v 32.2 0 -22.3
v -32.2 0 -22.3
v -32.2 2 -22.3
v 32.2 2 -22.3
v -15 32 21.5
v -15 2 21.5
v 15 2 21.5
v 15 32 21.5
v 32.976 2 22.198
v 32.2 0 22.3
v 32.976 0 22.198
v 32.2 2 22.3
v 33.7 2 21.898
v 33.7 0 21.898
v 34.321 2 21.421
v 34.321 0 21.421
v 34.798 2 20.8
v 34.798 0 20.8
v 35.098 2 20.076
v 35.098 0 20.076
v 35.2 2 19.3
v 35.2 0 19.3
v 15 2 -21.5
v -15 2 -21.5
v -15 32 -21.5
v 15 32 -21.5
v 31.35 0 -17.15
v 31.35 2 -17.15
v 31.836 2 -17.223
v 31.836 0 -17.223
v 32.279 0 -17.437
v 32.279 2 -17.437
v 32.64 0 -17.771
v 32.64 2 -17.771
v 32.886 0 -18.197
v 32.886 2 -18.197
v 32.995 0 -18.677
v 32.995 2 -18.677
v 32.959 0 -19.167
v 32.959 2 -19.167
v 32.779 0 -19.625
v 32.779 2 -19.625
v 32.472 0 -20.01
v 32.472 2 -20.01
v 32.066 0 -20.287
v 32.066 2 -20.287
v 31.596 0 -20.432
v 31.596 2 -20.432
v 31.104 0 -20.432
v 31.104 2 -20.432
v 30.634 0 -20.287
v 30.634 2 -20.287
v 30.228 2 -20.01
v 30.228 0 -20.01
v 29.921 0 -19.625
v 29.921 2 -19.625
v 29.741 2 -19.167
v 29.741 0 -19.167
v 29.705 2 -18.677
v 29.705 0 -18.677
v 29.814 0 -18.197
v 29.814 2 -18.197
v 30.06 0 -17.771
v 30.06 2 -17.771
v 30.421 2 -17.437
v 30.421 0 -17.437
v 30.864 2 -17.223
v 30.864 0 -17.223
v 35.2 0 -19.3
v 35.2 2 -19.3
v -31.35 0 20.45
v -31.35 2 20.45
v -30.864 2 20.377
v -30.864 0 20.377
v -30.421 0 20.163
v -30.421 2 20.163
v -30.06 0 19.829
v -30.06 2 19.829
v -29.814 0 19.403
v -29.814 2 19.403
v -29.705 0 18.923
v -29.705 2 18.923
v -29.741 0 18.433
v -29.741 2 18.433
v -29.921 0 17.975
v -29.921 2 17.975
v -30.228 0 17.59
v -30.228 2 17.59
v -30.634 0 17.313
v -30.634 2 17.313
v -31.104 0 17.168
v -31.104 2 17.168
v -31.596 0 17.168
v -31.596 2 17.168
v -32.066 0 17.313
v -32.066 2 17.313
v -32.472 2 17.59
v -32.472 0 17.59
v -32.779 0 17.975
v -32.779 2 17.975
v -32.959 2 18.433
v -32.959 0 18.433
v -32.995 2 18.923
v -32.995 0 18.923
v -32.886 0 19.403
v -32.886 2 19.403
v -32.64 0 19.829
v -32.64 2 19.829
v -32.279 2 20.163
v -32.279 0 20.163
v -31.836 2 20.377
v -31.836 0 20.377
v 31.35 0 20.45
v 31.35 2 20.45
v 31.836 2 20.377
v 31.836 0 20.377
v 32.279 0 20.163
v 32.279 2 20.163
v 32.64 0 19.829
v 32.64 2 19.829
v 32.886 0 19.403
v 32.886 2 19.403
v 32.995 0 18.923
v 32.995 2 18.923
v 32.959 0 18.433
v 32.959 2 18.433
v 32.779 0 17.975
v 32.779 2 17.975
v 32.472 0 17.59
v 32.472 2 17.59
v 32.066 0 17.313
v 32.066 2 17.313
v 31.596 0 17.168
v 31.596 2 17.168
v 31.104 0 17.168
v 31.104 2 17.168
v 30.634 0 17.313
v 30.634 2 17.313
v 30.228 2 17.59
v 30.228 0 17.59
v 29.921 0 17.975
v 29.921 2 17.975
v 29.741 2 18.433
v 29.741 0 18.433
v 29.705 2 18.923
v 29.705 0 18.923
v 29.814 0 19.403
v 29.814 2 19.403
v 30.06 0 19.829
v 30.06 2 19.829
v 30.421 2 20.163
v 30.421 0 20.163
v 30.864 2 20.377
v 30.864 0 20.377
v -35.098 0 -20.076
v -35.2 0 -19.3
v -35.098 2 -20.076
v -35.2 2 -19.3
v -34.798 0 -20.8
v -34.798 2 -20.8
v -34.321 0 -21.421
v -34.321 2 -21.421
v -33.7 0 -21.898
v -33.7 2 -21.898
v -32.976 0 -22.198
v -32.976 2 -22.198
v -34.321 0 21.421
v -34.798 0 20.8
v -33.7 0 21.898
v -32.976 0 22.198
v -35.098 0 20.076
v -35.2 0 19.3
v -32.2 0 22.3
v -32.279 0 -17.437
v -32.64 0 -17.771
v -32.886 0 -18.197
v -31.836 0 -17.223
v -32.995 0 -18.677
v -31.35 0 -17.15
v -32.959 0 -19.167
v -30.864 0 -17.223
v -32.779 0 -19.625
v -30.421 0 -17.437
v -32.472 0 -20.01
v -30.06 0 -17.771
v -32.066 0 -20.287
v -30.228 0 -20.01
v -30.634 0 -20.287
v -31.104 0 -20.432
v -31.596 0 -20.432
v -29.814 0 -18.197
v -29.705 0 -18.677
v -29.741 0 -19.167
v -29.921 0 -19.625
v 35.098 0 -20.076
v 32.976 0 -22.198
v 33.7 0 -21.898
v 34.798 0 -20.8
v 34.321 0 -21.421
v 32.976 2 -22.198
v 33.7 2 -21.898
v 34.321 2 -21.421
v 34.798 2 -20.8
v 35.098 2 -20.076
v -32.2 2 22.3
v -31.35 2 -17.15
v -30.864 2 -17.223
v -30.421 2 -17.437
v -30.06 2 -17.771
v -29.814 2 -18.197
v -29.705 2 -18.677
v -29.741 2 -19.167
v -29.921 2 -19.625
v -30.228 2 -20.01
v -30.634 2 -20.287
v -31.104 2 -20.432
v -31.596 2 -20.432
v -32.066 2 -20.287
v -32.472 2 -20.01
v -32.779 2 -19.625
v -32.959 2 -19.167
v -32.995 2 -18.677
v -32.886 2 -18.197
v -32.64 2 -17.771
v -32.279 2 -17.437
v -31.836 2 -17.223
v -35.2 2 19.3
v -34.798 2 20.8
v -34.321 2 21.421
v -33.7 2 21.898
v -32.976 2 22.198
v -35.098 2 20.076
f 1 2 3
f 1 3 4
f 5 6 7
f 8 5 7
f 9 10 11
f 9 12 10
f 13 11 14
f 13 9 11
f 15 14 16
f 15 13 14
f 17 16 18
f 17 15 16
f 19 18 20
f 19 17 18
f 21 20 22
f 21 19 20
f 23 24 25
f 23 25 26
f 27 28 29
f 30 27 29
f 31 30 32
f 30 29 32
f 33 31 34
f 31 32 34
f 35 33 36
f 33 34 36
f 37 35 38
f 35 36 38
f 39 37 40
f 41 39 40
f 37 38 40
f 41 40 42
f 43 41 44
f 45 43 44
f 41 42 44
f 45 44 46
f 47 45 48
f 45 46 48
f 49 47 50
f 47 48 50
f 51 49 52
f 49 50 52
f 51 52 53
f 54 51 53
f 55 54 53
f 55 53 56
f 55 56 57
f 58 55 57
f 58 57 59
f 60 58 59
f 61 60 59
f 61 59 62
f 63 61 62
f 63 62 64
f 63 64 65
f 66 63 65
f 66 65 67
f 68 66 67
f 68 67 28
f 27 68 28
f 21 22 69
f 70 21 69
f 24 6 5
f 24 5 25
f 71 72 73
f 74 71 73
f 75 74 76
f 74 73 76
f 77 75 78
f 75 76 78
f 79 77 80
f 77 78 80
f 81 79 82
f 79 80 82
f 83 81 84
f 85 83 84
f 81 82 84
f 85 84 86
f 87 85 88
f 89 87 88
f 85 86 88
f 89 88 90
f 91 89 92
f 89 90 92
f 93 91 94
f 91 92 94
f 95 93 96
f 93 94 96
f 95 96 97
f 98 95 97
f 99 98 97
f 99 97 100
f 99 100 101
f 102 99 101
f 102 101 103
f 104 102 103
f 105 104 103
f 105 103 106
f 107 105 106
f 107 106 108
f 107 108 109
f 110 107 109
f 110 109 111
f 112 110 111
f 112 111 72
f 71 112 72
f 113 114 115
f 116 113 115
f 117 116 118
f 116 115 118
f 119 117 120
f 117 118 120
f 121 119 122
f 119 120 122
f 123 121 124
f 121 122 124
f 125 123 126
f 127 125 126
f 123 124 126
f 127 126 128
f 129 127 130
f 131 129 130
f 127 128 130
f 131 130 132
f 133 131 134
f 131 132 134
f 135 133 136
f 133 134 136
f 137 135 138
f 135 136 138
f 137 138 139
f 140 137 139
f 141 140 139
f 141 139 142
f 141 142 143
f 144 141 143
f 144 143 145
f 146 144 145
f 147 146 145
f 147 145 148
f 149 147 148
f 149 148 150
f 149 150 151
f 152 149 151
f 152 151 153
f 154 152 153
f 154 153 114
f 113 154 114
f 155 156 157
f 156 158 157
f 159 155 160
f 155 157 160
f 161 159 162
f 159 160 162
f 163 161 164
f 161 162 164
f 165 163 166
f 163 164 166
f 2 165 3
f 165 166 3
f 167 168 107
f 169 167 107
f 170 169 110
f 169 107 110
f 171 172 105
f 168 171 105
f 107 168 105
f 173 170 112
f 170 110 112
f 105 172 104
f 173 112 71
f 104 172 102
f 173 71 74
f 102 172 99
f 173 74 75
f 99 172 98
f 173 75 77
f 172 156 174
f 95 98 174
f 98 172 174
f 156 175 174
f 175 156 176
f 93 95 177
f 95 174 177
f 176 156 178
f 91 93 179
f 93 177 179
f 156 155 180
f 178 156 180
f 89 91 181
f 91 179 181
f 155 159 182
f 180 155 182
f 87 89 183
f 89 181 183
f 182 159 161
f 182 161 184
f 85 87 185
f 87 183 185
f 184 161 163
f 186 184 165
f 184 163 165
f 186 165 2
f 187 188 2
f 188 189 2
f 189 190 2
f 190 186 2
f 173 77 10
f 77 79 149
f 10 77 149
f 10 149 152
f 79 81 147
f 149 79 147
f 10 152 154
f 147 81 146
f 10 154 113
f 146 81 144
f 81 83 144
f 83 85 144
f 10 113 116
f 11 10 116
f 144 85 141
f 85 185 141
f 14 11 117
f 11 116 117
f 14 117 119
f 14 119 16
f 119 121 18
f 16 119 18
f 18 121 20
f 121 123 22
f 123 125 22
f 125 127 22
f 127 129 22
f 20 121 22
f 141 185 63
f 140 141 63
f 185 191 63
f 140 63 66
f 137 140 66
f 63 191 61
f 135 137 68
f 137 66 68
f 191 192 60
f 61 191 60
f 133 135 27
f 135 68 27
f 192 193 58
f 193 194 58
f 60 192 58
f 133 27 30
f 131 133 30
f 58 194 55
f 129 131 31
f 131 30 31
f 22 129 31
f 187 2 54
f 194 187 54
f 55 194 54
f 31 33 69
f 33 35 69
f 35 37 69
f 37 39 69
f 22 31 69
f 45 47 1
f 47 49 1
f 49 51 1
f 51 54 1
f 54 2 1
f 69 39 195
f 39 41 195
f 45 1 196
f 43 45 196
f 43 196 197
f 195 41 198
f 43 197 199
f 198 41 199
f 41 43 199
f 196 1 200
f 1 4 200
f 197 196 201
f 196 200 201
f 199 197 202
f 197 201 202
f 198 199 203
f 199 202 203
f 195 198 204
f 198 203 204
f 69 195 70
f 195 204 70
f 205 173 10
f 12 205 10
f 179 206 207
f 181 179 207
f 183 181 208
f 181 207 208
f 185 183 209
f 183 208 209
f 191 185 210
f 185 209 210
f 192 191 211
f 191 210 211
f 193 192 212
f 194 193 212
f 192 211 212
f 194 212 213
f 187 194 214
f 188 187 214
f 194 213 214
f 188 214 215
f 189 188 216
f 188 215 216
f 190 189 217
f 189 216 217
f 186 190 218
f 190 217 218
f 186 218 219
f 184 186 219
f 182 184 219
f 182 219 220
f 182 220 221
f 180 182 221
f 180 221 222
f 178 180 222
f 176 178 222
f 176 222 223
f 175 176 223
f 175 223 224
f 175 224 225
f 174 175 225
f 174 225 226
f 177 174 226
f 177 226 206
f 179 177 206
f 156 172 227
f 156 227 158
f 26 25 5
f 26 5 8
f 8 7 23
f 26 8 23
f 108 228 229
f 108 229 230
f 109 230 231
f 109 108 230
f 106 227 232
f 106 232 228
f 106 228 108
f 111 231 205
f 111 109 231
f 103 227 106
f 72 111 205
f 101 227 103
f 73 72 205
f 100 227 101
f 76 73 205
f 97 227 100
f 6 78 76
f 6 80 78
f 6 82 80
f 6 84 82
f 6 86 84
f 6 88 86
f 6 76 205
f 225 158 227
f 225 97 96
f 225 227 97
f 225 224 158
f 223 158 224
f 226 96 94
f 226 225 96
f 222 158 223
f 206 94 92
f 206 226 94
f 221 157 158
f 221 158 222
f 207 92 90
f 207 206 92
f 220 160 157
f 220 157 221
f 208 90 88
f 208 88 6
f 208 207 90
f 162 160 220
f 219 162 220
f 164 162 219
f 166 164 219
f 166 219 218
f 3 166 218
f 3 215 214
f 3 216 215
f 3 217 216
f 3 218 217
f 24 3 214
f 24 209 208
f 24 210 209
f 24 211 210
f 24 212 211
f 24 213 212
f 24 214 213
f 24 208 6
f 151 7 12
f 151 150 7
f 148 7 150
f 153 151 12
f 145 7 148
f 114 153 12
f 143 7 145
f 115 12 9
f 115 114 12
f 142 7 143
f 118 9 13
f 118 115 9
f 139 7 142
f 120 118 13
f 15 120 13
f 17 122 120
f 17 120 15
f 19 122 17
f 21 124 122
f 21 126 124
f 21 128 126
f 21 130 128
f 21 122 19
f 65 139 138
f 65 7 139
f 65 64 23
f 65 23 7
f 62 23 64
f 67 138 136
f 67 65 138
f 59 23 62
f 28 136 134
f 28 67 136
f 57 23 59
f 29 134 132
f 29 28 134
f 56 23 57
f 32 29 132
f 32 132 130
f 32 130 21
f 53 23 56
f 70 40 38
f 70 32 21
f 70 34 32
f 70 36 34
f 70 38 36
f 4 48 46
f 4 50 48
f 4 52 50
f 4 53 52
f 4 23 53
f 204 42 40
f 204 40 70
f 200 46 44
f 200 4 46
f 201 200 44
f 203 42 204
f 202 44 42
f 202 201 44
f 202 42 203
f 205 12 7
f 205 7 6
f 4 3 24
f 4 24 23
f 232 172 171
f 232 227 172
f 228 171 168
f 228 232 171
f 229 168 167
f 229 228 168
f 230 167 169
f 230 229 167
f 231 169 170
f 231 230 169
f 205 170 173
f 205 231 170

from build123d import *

# Parameters (mm, degrees)
SKETCH1_W           = 70.4
SKETCH1_H           = 44.6
BOSS_EXTRUDE1_DEPTH = 2
SKETCH3_R           = 1.65
CUT_EXTRUDE1_DEPTH  = 42.717262614
FILLET1_R           = 3
SKETCH4_W           = 30
SKETCH4_H           = 43
BOSS_EXTRUDE2_DEPTH = 30


with BuildPart() as part:
    # Sketch1 → Boss-Extrude1 (new body)
    with BuildSketch(Plane(origin=(0, 0, 0), x_dir=(1, 0, 0), z_dir=(0, 1, 0))):
        Rectangle(SKETCH1_W, SKETCH1_H)
    extrude(amount=BOSS_EXTRUDE1_DEPTH)

    # Sketch3 → Cut-Extrude1 (cut, through all)
    with BuildSketch(Plane(origin=(0, 2, 0), x_dir=(1, 0, 0), z_dir=(0, 1, 0))):
        with Locations(Location((-31.35, 18.8, 0), (0, 0, 270))):
            Circle(SKETCH3_R)
        with Locations(Location((31.35, 18.8, 0), (0, 0, 270))):
            Circle(SKETCH3_R)
        with Locations(Location((31.35, -18.8, 0), (0, 0, 270))):
            Circle(SKETCH3_R)
        with Locations(Location((-31.35, -18.8, 0), (0, 0, 270))):
            Circle(SKETCH3_R)
    extrude(amount=-CUT_EXTRUDE1_DEPTH, mode=Mode.SUBTRACT)

    # Fillet1
    fillet1_edges = [part.edges().sort_by_distance(p)[0] for p in [
        (35.2, 1, 22.3),
        (-35.2, 1, 22.3),
        (-35.2, 1, -22.3),
        (35.2, 1, -22.3),
    ]]
    fillet(fillet1_edges, radius=FILLET1_R)

    # Sketch4 → Boss-Extrude2 (add)
    with BuildSketch(Plane(origin=(0, 2, 0), x_dir=(1, 0, 0), z_dir=(0, 1, 0))):
        Rectangle(SKETCH4_W, SKETCH4_H)
    extrude(amount=BOSS_EXTRUDE2_DEPTH)


solid = part.part
